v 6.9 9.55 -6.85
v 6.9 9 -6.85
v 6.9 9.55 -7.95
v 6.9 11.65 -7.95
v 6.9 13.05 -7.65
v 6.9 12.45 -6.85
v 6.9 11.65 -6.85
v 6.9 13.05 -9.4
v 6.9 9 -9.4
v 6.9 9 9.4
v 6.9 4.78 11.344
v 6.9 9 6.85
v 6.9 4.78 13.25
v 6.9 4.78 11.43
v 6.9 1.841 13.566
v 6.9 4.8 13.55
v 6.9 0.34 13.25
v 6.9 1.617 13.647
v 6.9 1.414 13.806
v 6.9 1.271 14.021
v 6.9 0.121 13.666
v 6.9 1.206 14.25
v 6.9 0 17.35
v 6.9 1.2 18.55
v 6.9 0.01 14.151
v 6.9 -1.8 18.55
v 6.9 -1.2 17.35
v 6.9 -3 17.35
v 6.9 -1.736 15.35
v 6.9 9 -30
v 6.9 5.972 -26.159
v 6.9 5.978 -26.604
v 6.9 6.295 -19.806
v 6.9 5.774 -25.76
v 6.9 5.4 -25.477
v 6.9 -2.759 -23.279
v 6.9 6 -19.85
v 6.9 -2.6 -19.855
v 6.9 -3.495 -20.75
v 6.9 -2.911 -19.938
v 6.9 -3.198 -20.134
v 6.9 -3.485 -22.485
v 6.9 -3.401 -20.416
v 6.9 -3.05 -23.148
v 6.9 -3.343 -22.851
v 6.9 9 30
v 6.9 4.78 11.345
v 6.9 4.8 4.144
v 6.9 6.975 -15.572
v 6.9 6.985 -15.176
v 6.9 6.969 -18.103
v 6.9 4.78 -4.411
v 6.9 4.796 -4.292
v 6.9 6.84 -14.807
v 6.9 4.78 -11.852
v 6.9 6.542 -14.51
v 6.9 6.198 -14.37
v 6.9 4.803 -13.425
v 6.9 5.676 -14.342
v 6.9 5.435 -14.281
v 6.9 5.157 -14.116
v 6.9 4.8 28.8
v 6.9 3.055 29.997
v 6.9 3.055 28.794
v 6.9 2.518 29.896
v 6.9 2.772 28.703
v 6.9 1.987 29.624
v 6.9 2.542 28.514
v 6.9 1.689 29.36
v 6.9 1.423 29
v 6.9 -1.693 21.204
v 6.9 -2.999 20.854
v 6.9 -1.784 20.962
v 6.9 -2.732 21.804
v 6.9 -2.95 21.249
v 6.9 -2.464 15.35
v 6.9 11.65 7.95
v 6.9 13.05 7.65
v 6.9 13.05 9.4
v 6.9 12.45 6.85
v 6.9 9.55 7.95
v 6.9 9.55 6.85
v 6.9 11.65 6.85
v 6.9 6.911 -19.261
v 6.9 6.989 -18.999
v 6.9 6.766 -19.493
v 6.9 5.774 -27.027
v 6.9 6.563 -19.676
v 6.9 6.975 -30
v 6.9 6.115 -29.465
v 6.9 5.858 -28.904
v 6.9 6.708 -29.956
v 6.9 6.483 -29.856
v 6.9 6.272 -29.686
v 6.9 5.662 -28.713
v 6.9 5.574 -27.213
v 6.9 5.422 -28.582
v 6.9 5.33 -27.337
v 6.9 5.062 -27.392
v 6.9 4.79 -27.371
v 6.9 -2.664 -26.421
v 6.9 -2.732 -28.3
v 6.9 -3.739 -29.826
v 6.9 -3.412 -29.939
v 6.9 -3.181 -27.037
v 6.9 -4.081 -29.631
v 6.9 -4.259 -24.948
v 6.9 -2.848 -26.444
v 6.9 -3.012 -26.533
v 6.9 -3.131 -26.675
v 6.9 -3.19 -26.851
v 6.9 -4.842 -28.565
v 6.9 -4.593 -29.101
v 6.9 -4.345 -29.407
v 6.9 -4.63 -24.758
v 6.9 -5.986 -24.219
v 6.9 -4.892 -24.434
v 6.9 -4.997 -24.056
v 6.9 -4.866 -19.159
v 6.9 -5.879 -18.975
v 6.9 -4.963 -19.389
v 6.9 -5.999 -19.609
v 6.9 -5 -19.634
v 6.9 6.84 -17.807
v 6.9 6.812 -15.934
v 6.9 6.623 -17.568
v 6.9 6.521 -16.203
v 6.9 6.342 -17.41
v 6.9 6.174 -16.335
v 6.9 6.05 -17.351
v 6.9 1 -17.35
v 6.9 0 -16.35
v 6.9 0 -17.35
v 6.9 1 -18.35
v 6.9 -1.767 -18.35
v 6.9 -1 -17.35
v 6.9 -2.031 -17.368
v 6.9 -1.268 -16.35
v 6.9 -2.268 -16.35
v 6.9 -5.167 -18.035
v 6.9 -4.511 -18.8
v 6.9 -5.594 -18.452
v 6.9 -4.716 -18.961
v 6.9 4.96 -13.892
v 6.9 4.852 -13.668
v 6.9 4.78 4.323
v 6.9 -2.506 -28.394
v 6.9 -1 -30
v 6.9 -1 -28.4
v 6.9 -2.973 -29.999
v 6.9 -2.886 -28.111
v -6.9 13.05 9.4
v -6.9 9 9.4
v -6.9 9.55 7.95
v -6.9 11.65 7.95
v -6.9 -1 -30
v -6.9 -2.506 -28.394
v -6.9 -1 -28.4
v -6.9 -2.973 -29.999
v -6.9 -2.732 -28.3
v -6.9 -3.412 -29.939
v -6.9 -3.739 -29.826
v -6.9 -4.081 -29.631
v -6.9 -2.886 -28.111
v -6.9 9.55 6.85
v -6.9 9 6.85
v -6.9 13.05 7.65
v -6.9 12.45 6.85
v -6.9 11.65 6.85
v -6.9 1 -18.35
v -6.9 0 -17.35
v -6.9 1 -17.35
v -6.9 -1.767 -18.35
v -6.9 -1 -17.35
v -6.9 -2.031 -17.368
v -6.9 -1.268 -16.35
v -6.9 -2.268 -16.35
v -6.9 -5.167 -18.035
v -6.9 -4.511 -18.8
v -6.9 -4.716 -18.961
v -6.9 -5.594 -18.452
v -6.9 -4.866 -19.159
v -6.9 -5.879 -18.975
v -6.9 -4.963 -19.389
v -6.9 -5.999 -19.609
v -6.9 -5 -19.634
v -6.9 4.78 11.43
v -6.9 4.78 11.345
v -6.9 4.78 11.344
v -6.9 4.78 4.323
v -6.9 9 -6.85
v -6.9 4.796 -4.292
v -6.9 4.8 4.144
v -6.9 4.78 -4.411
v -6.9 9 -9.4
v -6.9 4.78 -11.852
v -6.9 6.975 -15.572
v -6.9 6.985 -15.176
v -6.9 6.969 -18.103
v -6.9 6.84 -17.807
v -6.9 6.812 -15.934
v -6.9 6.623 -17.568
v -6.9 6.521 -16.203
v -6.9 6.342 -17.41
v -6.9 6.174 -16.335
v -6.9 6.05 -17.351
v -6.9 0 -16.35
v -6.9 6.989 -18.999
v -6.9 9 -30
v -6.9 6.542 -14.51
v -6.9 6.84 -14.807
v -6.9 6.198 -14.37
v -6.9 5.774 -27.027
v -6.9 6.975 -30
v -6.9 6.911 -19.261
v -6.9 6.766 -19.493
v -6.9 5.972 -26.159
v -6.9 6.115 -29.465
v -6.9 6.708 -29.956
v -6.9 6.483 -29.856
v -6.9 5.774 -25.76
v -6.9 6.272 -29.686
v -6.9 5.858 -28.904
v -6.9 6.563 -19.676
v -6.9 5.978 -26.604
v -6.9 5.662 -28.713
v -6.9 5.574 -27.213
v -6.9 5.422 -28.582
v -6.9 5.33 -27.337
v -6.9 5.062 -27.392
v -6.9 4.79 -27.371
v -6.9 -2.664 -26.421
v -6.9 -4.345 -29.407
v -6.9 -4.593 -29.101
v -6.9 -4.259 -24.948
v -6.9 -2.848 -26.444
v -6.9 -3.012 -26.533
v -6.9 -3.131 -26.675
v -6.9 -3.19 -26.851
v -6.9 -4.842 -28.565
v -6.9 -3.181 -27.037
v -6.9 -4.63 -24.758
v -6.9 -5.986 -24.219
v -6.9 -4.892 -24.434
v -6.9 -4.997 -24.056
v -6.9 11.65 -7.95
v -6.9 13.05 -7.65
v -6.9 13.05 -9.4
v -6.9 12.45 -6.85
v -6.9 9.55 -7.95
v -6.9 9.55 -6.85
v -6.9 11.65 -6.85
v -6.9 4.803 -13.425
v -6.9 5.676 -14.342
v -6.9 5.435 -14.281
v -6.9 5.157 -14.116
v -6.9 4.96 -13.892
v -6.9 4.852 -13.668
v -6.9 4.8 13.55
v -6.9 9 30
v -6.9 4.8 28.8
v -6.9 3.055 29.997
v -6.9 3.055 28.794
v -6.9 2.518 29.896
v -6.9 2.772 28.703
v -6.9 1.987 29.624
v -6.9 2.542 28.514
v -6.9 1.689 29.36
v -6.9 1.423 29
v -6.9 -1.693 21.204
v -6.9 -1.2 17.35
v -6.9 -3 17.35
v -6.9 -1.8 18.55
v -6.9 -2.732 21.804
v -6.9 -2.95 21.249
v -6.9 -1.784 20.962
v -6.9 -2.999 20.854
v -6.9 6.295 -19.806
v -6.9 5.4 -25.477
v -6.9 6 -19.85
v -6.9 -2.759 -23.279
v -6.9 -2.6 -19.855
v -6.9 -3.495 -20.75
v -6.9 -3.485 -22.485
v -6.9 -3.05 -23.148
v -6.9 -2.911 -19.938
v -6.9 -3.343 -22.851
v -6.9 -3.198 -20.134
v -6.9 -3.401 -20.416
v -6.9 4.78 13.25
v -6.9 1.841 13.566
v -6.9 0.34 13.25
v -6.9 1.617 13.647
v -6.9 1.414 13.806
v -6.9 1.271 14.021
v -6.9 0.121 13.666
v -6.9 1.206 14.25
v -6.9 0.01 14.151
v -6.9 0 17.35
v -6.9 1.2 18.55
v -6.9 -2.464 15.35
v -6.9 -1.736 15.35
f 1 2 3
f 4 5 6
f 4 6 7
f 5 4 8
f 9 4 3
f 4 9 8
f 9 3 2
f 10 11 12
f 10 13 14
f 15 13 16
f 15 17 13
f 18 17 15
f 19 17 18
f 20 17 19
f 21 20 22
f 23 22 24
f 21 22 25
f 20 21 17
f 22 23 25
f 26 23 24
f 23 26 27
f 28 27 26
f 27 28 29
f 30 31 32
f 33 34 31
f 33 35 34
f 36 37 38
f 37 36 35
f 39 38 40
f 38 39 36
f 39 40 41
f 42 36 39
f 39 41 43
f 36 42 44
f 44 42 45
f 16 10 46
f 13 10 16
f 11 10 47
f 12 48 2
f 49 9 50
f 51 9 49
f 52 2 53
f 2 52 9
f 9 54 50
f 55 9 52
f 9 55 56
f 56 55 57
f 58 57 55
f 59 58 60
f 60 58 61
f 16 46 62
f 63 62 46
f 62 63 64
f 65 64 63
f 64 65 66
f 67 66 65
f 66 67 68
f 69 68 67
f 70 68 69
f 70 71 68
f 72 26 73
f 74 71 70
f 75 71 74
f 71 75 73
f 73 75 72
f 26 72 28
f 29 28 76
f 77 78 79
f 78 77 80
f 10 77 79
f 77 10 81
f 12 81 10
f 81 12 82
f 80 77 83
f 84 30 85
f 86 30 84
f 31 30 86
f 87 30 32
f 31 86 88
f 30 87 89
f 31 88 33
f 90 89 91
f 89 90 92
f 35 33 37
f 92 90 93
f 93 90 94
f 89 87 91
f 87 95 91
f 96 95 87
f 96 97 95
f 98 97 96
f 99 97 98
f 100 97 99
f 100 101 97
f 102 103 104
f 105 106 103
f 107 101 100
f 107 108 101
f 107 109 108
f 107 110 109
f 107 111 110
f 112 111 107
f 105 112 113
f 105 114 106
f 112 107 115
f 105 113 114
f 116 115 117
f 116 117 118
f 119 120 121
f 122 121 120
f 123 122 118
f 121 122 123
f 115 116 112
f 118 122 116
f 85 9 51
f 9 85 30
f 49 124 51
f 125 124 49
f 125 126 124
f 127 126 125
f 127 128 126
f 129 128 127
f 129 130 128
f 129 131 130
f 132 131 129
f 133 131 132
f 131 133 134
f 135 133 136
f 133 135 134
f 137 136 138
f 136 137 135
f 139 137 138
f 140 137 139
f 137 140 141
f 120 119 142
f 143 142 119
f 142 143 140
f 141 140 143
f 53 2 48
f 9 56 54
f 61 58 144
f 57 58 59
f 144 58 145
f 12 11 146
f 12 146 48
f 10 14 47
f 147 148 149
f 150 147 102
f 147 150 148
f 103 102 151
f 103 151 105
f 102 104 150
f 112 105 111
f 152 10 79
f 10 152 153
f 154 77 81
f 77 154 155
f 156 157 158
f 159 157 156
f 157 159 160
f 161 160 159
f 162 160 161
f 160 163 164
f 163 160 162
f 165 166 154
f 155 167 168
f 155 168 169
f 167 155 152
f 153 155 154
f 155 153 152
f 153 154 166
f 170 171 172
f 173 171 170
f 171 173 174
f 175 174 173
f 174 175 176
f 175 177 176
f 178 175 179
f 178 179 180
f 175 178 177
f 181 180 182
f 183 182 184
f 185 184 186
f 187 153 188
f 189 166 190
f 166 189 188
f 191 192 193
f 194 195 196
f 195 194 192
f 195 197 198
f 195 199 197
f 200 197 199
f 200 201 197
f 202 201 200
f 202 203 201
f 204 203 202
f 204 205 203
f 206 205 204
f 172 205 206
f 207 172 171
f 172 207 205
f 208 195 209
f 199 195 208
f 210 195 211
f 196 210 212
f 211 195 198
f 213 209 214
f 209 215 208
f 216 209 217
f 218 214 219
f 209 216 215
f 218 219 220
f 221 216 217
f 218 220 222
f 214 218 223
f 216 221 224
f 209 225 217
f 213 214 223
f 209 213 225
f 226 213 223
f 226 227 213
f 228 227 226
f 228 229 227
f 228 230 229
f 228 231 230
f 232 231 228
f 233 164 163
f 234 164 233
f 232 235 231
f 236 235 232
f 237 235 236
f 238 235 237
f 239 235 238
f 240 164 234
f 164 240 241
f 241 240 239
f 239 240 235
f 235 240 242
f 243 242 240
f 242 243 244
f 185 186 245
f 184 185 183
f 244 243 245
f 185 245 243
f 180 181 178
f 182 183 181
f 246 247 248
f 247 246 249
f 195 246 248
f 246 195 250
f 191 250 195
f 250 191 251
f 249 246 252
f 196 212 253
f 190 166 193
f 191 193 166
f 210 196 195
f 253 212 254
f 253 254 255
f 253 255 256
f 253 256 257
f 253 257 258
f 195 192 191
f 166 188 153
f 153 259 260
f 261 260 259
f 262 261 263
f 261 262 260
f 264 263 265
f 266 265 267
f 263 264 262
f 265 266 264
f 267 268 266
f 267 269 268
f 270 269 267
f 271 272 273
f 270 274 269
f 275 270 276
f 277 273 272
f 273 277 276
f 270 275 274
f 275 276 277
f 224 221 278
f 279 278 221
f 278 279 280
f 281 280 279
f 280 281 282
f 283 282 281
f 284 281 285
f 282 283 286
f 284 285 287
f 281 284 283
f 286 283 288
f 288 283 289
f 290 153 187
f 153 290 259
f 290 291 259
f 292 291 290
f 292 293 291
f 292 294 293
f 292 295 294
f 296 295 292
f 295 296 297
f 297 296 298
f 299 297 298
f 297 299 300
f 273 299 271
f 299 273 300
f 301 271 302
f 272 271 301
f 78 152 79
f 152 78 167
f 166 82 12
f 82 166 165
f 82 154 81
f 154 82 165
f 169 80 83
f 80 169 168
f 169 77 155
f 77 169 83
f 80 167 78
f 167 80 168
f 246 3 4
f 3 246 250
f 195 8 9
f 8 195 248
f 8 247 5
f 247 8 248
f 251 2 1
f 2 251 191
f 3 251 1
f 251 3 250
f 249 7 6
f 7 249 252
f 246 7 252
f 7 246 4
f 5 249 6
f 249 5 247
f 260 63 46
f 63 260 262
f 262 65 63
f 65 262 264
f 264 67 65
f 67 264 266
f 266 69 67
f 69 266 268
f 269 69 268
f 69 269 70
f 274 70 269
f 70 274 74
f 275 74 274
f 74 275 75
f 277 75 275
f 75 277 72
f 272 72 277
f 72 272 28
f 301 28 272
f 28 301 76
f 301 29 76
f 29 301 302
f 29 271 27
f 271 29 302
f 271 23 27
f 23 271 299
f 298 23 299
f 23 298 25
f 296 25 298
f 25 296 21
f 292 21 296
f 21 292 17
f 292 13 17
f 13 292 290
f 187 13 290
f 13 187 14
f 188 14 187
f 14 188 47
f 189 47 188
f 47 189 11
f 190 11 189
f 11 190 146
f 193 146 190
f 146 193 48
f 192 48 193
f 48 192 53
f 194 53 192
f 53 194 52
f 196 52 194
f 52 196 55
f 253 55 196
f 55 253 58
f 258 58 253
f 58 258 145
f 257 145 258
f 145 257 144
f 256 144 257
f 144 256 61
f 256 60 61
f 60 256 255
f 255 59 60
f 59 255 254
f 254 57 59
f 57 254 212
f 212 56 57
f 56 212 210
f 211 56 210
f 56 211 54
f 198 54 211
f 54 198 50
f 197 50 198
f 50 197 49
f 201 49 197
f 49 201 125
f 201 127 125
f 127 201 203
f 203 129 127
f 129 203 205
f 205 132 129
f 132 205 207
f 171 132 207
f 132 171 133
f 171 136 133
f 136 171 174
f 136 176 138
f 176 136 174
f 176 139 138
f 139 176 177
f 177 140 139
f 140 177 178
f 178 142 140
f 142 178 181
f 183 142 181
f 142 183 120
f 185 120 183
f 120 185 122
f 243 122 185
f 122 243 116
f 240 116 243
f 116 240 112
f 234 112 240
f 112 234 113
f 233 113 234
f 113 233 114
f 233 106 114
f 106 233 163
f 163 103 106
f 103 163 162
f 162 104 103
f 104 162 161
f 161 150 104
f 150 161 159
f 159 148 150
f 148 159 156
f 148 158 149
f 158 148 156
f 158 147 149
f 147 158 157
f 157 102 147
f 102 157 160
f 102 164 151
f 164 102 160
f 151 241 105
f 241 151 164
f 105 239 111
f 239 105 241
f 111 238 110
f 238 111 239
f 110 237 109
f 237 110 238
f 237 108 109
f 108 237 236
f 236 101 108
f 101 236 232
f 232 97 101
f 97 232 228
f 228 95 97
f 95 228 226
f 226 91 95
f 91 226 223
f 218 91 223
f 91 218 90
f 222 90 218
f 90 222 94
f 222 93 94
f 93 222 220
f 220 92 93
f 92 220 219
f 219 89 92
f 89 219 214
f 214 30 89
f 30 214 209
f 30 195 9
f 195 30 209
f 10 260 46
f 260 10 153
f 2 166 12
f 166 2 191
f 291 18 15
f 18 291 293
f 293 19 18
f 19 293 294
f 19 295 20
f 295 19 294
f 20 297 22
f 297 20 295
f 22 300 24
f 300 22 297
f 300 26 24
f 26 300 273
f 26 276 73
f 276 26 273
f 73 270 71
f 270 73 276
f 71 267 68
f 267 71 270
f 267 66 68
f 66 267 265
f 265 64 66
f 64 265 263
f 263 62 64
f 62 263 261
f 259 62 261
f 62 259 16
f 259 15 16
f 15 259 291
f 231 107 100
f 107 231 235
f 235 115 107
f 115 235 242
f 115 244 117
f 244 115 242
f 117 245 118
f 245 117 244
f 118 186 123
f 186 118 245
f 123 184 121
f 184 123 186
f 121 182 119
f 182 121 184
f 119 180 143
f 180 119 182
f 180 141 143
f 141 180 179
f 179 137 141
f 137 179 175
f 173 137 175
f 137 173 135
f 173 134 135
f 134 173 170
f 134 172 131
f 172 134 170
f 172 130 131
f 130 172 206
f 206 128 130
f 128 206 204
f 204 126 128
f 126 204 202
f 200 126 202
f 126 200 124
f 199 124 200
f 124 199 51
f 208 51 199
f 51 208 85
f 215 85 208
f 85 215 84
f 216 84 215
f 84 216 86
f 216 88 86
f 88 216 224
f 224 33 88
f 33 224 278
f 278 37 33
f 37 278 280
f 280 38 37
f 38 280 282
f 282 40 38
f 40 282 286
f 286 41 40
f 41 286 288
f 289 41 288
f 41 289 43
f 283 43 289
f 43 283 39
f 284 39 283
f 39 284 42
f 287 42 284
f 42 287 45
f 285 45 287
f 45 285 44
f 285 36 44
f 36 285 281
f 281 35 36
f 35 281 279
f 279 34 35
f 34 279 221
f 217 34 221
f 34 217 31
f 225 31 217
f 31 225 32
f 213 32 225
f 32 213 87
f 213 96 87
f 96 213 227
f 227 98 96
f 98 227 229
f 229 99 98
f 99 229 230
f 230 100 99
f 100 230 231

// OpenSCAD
// ChatGPT HiLetgo level-shifter DIN mount — Cable Clamp remix
// Design version: 5
// VERSIONING RULE: Increment design_version by 1 for every repository check-in of this design.
//
// This is a SEPARATE design from ChatGPT_HiLetgo_Level_Shifter_DIN_Mount.scad.
// It is based on the user-supplied DIN_Rail_Cable_Clamp.step.
//
// What changed from the cable clamp:
//   1. The two center cable-rest arms are removed completely.
//   2. The two rectangular cable-tie slots in the spine are filled.
//   3. A true full-width top/bottom slide cradle is added for the HiLetgo PCB.
//   4. The PCB is parallel to the DIN rail and slides in from either X side.
//   5. v4 flips the PCB cradle to the OPPOSITE (+Y) face of the DIN body.
//      The v3 cradle was on the cable-clamp-arm side; this version mounts the
//      PCB on the other side of the central DIN spine.
//   6. v5 widens the entire DIN clip body to exactly match the PCB cradle width.
//      There is no longer a wider cradle sitting on a narrower DIN body.
//
// The original STEP is effectively a 6 mm-wide extrusion. To keep this
// OpenSCAD source compact and robust, its center-plane Y/Z profile was captured
// from the STEP-derived mesh and simplified to ~0.03 mm. In v5 that same DIN
// spring/hook profile is extruded to the PCB cradle width instead of the original
// 6 mm, so the complete mount has one consistent width.

$fn = 48;
design_version = 5;

// ---------- HiLetgo PCB ----------
pcb_z = 15.3;             // board height in installed orientation
pcb_x = 12.6;             // board width across the DIN clip
pcb_t = 1.6;              // board thickness (Y)
pcb_edge_clear = 0.30;     // top/bottom clearance
pcb_face_clear = 0.25;     // front/rear clearance

// ---------- Mount / cradle ----------
cradle_side_margin = 0.60;
mount_width = pcb_x + 2*cradle_side_margin;  // 13.8 mm: DIN body and PCB cradle match
spine_front_y = 4.80;      // cable-arm side of the remaining center spine
spine_back_y = 9.00;       // opposite face of the DIN spine

// v4: PCB holder is on the +Y side of the spine (opposite v3).
// The board sits just outside the spine and slides in from either X side.
pcb_inner_y = spine_back_y + 0.80;
pcb_outer_y = pcb_inner_y + pcb_t;
slot_inner_y = pcb_inner_y - pcb_face_clear;
slot_outer_y = pcb_outer_y + pcb_face_clear;

board_half_z = pcb_z/2;
channel_inner_z = board_half_z + pcb_edge_clear;
channel_wall_t = 1.45;
channel_outer_z = channel_inner_z + channel_wall_t;
edge_overlap = 1.10;
outer_lip_t = 0.80;
lead_in = 0.60;

cradle_width_x = mount_width;  // exactly the same width as the DIN clip body

// ---------- STEP-derived 2D DIN profile ----------
// Coordinates are [Y depth, Z vertical].  Only the two DIN-spring voids are
// retained as holes.  The original rectangular cable-tie slots are intentionally
// NOT subtracted, so they become solid in this PCB-mount remix.
source_outer = [
    [0.0000, -16.3500],
    [0.0000, -17.3500],
    [-1.0000, -17.3500],
    [-1.2679, -16.3500],
    [-2.2679, -16.3500],
    [-5.1675, -18.0355],
    [-5.5943, -18.4518],
    [-5.8794, -18.9754],
    [-5.9994, -19.6095],
    [-5.9859, -24.2194],
    [-4.8419, -28.5652],
    [-4.5932, -29.1009],
    [-4.3446, -29.4072],
    [-4.0813, -29.6307],
    [-3.7387, -29.8263],
    [-3.4123, -29.9393],
    [-2.9728, -29.9994],
    [-1.0000, -30.0000],
    [-1.0000, -28.4000],
    [-2.5064, -28.3945],
    [-2.7320, -28.3004],
    [-2.8860, -28.1106],
    [-3.1812, -27.0372],
    [-3.1905, -26.8515],
    [-3.1313, -26.6752],
    [-3.0118, -26.5328],
    [-2.8485, -26.4439],
    [-2.6640, -26.4208],
    [5.4219, -28.5823],
    [5.6620, -28.7130],
    [5.8577, -28.9039],
    [6.1149, -29.4654],
    [6.2722, -29.6858],
    [6.4830, -29.8560],
    [6.7079, -29.9564],
    [6.9753, -29.9997],
    [9.0000, -30.0000],
    [9.0000, 30.0000],
    [3.0550, 29.9975],
    [2.5177, 29.8959],
    [1.9872, 29.6239],
    [1.6886, 29.3603],
    [1.4226, 29.0000],
    [-2.7321, 21.8038],
    [-2.9499, 21.2489],
    [-2.9994, 20.8537],
    [-3.0000, 17.3500],
    [-2.4641, 15.3500],
    [-1.7359, 15.3500],
    [-1.2000, 17.3500],
    [0.0000, 17.3500],
    [0.0099, 14.1509],
    [0.1206, 13.6660],
    [0.3761, 13.1825],
    [0.6035, 12.9183],
    [0.8734, 12.6975],
    [1.1774, 12.5270],
    [1.5550, 12.4001],
    [1.9501, 12.3506],
    [4.0143, 12.3490],
    [4.3492, 12.2596],
    [4.6306, 12.0247],
    [4.7784, 11.7112],
    [4.7805, 11.3446],
    [4.6238, 11.0132],
    [4.2831, 10.7568],
    [4.0647, 10.7016],
    [3.8396, 10.7075],
    [-1.0000, 12.0000],
    [-5.1490, 11.9888],
    [-5.4339, 11.9010],
    [-5.6802, 11.7331],
    [-5.8782, 11.4783],
    [-5.9802, 11.1981],
    [-5.9888, 8.8510],
    [-5.8400, 8.4575],
    [-5.5214, 8.1467],
    [-5.2708, 8.0374],
    [-5.0249, 8.0003],
    [-1.0000, 8.0000],
    [2.7186, 6.9998],
    [3.4513, 6.6486],
    [4.0135, 6.1689],
    [4.4757, 5.5006],
    [4.7262, 4.8053],
    [4.8000, 4.1439],
    [4.7963, -4.2920],
    [4.7262, -4.8053],
    [4.5965, -5.2301],
    [4.4055, -5.6311],
    [4.1573, -5.9994],
    [3.8030, -6.3773],
    [3.4513, -6.6486],
    [3.0634, -6.8649],
    [2.5765, -7.0417],
    [-1.0000, -8.0000],
    [-5.1981, -8.0198],
    [-5.4783, -8.1218],
    [-5.6982, -8.2841],
    [-5.8782, -8.5217],
    [-5.9749, -8.7775],
    [-6.0000, -11.0000],
    [-5.9691, -11.2468],
    [-5.8660, -11.5000],
    [-5.6802, -11.7331],
    [-5.4562, -11.8899],
    [-5.1981, -11.9802],
    [-1.0000, -12.0000],
    [3.5893, -10.7716],
    [3.9095, -10.7551],
    [4.2407, -10.8515],
    [4.5847, -11.1292],
    [4.7753, -11.5281],
    [4.8028, -13.4247],
    [4.8521, -13.6685],
    [4.9600, -13.8925],
    [5.1572, -14.1160],
    [5.4347, -14.2809],
    [5.6757, -14.3422],
    [6.1981, -14.3698],
    [6.5425, -14.5100],
    [6.8400, -14.8075],
    [6.9848, -15.1764],
    [6.9749, -15.5725],
    [6.8119, -15.9337],
    [6.5214, -16.2033],
    [6.1736, -16.3348],
];

lower_spring_void = [
    [-4.5107, -18.7997],
    [-2.0306, -17.3676],
    [-1.7673, -18.3500],
    [1.0000, -18.3500],
    [1.0000, -17.3500],
    [6.0498, -17.3512],
    [6.3420, -17.4103],
    [6.6235, -17.5682],
    [6.8400, -17.8075],
    [6.9691, -18.1032],
    [6.9888, -18.9990],
    [6.9115, -19.2613],
    [6.7660, -19.4928],
    [6.5633, -19.6762],
    [6.2948, -19.8056],
    [6.0000, -19.8500],
    [-2.5996, -19.8550],
    [-2.9113, -19.9385],
    [-3.1982, -20.1341],
    [-3.4010, -20.4161],
    [-3.4950, -20.7504],
    [-3.4851, -22.4854],
    [-3.3429, -22.8514],
    [-3.0504, -23.1483],
    [-2.7588, -23.2793],
    [5.3999, -25.4770],
    [5.7740, -25.7604],
    [5.9721, -26.1589],
    [5.9776, -26.6039],
    [5.7740, -27.0267],
    [5.5736, -27.2127],
    [5.3303, -27.3374],
    [5.0623, -27.3916],
    [4.7896, -27.3712],
    [-4.2588, -24.9479],
    [-4.6301, -24.7585],
    [-4.8919, -24.4342],
    [-4.9973, -24.0560],
    [-4.9997, -19.6345],
    [-4.9626, -19.3886],
    [-4.8660, -19.1594],
    [-4.7159, -18.9612],
];

upper_spring_void = [
    [4.8000, 28.8000],
    [4.8000, 13.5500],
    [1.8415, 13.5659],
    [1.6174, 13.6474],
    [1.4136, 13.8059],
    [1.2708, 14.0210],
    [1.2062, 14.2505],
    [1.2000, 18.5500],
    [-1.8000, 18.5500],
    [-1.7841, 20.9624],
    [-1.6928, 21.2038],
    [2.5419, 28.5142],
    [2.7721, 28.7026],
    [3.0552, 28.7938],
];

module source_profile_2d() {
    difference() {
        polygon(points=source_outer);
        polygon(points=lower_spring_void);
        polygon(points=upper_spring_void);
    }
}

module rect_yz(y0,y1,z0,z1) {
    translate([y0,z0]) square([y1-y0,z1-z0], center=false);
}

module clip_without_cable_arms_2d() {
    difference() {
        source_profile_2d();
        // Removes both center cable-rest arms while stopping just before the
        // central spine.  Upper/lower DIN spring hooks are untouched.
        rect_yz(-6.20, spine_front_y-0.02, -13.25, 13.25);
    }
}

module din_clip_body() {
    // Original DIN clip, with the cable-rest arms removed.
    multmatrix([
        [0,0,1,0],
        [1,0,0,0],
        [0,1,0,0],
        [0,0,0,1]
    ])
        linear_extrude(height=mount_width, center=true, convexity=20)
            clip_without_cable_arms_2d();
}

module pcb_cradle() {
    // v4 holder is on the +Y face of the DIN spine.
    // The PCB slides along X between top/bottom edge channels.
    xw = cradle_width_x;
    bridge_y0 = spine_back_y - 0.25;  // overlap body for a robust union
    bridge_y1 = slot_outer_y + outer_lip_t + lead_in;

    // TOP channel: overhead bridge/wall.
    translate([0, (bridge_y0+bridge_y1)/2,
               (channel_inner_z+channel_outer_z)/2])
        cube([xw, bridge_y1-bridge_y0,
              channel_outer_z-channel_inner_z], center=true);

    // Inner support ledge (spine side).
    translate([0, (bridge_y0+slot_inner_y)/2,
               channel_inner_z-edge_overlap/2])
        cube([xw, slot_inner_y-bridge_y0, edge_overlap], center=true);

    // Outer retaining lip.
    translate([0, slot_outer_y+outer_lip_t/2,
               channel_inner_z-edge_overlap/2])
        cube([xw, outer_lip_t, edge_overlap], center=true);

    // Outer lead-in ramp.
    hull() {
        translate([0, slot_outer_y+outer_lip_t+lead_in-0.05,
                   channel_inner_z-0.15])
            cube([xw,0.10,0.30], center=true);
        translate([0, slot_outer_y+outer_lip_t-0.05,
                   channel_inner_z-edge_overlap/2])
            cube([xw,0.10,edge_overlap], center=true);
    }

    // BOTTOM channel, mirrored in Z.
    translate([0, (bridge_y0+bridge_y1)/2,
               -(channel_inner_z+channel_outer_z)/2])
        cube([xw, bridge_y1-bridge_y0,
              channel_outer_z-channel_inner_z], center=true);

    translate([0, (bridge_y0+slot_inner_y)/2,
               -channel_inner_z+edge_overlap/2])
        cube([xw, slot_inner_y-bridge_y0, edge_overlap], center=true);

    translate([0, slot_outer_y+outer_lip_t/2,
               -channel_inner_z+edge_overlap/2])
        cube([xw, outer_lip_t, edge_overlap], center=true);

    hull() {
        translate([0, slot_outer_y+outer_lip_t+lead_in-0.05,
                   -channel_inner_z+0.15])
            cube([xw,0.10,0.30], center=true);
        translate([0, slot_outer_y+outer_lip_t-0.05,
                   -channel_inner_z+edge_overlap/2])
            cube([xw,0.10,edge_overlap], center=true);
    }
}

module mount() {
    union() {
        din_clip_body();
        pcb_cradle();
    }
}

mount();

// Preview-only PCB envelope. Set to true to verify the actual 15.3 x 12.6 x 1.6 board fit.
show_reference_pcb = false;
if (show_reference_pcb)
    %translate([0, (pcb_inner_y+pcb_outer_y)/2, 0])
        cube([pcb_x, pcb_t, pcb_z], center=true);
